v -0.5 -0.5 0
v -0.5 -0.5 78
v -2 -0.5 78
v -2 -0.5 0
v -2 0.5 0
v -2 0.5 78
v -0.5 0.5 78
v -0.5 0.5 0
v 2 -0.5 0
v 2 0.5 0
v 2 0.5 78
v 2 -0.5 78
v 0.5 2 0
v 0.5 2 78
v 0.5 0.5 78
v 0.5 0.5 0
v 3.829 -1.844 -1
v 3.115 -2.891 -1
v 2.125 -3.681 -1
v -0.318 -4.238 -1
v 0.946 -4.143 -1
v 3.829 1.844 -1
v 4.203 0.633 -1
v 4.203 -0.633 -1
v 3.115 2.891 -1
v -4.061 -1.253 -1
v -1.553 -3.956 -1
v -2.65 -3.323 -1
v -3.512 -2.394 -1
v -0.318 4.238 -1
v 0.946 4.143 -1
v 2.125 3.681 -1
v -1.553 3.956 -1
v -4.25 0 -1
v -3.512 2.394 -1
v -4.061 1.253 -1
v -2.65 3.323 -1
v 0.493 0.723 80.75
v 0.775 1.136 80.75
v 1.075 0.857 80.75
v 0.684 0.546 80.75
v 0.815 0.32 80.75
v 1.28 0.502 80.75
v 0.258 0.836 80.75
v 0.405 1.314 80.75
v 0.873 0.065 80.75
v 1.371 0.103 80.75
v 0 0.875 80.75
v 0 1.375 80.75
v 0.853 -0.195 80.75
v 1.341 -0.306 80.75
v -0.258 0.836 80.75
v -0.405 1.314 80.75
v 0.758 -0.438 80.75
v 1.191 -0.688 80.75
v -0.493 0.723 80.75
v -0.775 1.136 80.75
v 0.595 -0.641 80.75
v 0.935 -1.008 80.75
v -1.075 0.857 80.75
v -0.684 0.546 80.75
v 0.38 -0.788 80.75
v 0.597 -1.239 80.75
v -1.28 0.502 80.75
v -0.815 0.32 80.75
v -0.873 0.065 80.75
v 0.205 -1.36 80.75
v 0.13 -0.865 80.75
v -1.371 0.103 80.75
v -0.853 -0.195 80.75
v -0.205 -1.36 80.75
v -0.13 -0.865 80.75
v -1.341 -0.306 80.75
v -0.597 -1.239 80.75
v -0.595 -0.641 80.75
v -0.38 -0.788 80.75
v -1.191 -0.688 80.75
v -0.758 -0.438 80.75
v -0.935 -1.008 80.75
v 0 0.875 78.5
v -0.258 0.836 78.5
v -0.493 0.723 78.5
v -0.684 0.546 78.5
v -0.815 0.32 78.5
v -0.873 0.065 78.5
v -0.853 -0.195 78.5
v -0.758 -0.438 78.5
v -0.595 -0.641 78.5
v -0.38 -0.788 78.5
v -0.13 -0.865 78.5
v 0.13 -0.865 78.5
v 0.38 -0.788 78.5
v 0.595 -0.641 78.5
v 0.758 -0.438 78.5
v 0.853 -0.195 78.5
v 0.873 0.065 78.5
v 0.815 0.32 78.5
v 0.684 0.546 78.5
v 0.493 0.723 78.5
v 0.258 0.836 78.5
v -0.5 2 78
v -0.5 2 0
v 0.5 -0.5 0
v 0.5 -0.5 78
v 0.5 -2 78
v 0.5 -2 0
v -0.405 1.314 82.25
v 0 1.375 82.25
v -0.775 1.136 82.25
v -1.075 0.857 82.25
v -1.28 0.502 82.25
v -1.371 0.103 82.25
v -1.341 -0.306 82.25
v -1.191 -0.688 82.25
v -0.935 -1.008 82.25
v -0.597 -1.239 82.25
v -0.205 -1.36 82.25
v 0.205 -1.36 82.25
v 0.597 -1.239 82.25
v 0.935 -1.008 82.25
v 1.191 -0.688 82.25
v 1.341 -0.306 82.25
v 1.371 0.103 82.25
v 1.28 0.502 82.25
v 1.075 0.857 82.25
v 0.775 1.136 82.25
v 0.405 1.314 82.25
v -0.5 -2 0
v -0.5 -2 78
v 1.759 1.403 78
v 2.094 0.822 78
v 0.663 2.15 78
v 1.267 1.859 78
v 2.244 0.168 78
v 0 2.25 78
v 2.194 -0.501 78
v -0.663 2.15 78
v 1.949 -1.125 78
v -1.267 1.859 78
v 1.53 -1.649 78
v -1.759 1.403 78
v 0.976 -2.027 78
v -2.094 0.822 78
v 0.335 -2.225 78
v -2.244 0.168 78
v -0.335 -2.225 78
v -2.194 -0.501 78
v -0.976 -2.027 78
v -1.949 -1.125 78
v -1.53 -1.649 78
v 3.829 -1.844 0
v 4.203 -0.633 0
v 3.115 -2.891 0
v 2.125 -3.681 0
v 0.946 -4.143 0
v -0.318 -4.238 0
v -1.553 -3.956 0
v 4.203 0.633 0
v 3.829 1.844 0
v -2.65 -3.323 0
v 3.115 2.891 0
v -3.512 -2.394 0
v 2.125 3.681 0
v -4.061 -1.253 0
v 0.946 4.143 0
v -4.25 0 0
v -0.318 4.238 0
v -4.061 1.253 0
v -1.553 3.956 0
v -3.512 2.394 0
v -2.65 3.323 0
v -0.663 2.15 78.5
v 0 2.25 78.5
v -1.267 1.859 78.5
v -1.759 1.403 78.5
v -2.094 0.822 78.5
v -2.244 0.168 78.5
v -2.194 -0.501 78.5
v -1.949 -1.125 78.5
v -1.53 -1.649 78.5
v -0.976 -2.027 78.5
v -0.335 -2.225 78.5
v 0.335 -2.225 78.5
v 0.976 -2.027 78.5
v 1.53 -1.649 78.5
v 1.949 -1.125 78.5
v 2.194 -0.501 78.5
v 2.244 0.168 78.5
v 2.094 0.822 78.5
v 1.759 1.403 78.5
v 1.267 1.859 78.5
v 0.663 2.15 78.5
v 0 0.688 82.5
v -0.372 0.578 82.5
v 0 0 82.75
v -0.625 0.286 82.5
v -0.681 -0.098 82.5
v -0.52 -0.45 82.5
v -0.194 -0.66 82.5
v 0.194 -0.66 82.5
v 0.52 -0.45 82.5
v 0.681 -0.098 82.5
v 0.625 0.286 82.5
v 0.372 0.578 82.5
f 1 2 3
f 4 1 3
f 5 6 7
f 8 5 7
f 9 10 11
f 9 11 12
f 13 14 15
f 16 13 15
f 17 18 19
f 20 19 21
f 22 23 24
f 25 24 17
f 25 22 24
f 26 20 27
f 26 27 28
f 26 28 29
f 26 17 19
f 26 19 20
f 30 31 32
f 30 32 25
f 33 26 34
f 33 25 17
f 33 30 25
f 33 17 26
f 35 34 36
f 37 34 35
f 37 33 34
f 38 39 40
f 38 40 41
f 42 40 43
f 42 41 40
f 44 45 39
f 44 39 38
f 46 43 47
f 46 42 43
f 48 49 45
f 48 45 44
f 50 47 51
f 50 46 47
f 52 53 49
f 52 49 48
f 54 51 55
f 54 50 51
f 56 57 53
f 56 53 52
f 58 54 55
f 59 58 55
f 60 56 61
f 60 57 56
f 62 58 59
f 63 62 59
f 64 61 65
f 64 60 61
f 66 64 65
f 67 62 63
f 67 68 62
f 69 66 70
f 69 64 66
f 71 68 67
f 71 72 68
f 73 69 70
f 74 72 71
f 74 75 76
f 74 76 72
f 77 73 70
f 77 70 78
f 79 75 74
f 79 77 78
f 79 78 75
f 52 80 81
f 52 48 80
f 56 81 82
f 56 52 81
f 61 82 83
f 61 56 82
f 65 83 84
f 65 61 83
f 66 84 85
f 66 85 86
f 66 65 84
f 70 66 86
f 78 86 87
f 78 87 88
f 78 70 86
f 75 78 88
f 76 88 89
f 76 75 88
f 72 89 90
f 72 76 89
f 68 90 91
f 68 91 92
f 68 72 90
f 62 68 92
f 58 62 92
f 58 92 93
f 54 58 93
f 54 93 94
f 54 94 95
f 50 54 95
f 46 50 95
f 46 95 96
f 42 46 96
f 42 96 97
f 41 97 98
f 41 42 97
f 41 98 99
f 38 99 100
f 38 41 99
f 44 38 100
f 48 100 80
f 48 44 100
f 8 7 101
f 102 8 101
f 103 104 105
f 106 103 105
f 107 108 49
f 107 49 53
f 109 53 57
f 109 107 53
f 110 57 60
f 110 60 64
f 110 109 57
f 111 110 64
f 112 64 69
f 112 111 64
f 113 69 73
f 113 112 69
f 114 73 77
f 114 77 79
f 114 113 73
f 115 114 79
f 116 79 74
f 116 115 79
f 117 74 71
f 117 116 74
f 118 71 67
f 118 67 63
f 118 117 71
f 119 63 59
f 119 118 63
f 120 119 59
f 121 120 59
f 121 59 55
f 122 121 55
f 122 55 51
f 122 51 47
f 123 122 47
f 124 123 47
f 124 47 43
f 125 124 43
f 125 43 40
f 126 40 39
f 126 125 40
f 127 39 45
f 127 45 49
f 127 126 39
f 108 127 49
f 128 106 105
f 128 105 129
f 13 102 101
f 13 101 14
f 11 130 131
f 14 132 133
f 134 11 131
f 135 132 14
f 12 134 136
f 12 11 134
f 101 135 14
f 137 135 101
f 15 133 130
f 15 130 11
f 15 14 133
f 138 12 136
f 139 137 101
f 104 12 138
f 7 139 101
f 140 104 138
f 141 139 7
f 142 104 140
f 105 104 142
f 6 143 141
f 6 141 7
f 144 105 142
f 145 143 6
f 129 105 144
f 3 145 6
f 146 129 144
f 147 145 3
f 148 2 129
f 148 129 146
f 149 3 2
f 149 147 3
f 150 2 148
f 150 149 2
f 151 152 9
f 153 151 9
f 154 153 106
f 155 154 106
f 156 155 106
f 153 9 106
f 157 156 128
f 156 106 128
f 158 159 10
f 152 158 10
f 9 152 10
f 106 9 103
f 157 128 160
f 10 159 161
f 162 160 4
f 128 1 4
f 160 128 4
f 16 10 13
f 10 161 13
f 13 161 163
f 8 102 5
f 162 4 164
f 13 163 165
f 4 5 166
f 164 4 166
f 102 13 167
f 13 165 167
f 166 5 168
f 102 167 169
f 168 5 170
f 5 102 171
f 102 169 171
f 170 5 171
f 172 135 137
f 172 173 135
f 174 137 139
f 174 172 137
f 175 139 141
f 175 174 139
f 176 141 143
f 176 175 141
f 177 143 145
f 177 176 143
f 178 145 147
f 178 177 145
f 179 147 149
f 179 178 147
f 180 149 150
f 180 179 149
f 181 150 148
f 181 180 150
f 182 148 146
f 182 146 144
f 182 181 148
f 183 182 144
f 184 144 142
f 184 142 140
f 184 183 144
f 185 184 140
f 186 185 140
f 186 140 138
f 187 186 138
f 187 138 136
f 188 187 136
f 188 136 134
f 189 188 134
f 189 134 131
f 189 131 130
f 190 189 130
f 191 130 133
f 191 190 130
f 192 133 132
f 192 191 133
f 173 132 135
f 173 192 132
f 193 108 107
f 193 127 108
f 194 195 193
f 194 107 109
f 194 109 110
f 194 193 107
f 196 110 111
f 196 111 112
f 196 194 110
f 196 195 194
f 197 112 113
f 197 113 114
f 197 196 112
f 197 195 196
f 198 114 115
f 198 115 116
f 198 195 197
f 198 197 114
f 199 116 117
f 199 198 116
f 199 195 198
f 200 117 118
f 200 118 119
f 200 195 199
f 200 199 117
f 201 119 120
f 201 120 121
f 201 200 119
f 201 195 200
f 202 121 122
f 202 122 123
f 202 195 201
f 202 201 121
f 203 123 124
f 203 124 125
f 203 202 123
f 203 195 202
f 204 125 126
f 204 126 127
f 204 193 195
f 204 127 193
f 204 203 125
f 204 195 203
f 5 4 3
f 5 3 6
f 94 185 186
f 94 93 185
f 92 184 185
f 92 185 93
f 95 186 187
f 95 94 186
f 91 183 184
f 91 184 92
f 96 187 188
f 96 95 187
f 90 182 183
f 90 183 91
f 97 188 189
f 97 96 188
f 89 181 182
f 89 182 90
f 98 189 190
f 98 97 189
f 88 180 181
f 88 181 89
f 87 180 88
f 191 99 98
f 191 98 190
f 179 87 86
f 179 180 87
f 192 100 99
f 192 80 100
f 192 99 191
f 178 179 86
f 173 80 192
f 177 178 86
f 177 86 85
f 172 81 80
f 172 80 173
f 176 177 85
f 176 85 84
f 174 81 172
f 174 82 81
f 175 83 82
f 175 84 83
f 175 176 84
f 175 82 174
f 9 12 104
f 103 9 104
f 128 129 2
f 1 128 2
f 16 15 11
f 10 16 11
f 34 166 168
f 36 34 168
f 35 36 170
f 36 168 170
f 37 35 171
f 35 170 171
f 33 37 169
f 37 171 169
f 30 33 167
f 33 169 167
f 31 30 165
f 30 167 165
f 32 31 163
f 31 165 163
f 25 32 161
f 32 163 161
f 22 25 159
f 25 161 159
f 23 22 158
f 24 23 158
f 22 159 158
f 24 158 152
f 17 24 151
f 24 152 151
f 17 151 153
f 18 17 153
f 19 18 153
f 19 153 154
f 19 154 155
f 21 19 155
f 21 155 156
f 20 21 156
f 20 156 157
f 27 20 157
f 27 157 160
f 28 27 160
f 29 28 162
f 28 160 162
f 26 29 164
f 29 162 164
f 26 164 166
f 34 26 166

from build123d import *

# Parameters (mm, degrees)
AUFSATZ_LINEAR_AUSTRAGEN1_DEPTH = 78
SKIZZE3_R                       = 4.25
AUFSATZ_LINEAR_AUSTRAGEN3_DEPTH = 1
FASE1_SIZE2                     = 1.375
FASE1_SIZE                      = 0.500459072


with BuildPart() as part:
    # Skizze1 → Aufsatz-Linear austragen1 (new body)
    with BuildSketch(Plane.XY):
        Polygon((0.5, 0.5), (2, 0.5), (2, -0.5), (0.5, -0.5), (0.5, -2), (-0.5, -2), (-0.5, -0.5), (-2, -0.5), (-2, 0.5), (-0.5, 0.5), (-0.5, 2), (0.5, 2), align=None)
    extrude(amount=AUFSATZ_LINEAR_AUSTRAGEN1_DEPTH)

    # Skizze3 → Aufsatz-Linear austragen3 (add)
    with BuildSketch(Plane(origin=(0, 0, 0), x_dir=(-1, 0, 0), z_dir=(0, 0, -1))):
        Circle(SKIZZE3_R)
    extrude(amount=AUFSATZ_LINEAR_AUSTRAGEN3_DEPTH)

    # Skizze4 → Rotation1 (revolve)
    with BuildSketch(Plane(origin=(0, 0, 0), x_dir=(0, 0, -1), z_dir=(1, 0, 0))):
        Polygon((-78, 0), (-78, 1.335941473), (-78, 2.25), (-78.5, 2.25), (-78.5, 0.875), (-80.75, 0.875), (-80.75, 1.375), (-82.75, 1.375), (-82.75, 0), align=None)
    revolve(axis=Axis((0, 0, 0), (0, 0, 1)))

    # Fase1
    fase1_edges = [part.edges().sort_by_distance(p)[0] for p in [
        (0, -1.375, 82.75),
    ]]
    fase1_side = [part.faces().sort_by_distance(p)[0] for p in [
        (0, -1.375, 82.739990819),
    ]]
    chamfer(fase1_edges, length=FASE1_SIZE - 0.0001, length2=FASE1_SIZE2 - 0.0001, reference=fase1_side[0])  # a hair under: the kernel refuses the full size


solid = part.part
